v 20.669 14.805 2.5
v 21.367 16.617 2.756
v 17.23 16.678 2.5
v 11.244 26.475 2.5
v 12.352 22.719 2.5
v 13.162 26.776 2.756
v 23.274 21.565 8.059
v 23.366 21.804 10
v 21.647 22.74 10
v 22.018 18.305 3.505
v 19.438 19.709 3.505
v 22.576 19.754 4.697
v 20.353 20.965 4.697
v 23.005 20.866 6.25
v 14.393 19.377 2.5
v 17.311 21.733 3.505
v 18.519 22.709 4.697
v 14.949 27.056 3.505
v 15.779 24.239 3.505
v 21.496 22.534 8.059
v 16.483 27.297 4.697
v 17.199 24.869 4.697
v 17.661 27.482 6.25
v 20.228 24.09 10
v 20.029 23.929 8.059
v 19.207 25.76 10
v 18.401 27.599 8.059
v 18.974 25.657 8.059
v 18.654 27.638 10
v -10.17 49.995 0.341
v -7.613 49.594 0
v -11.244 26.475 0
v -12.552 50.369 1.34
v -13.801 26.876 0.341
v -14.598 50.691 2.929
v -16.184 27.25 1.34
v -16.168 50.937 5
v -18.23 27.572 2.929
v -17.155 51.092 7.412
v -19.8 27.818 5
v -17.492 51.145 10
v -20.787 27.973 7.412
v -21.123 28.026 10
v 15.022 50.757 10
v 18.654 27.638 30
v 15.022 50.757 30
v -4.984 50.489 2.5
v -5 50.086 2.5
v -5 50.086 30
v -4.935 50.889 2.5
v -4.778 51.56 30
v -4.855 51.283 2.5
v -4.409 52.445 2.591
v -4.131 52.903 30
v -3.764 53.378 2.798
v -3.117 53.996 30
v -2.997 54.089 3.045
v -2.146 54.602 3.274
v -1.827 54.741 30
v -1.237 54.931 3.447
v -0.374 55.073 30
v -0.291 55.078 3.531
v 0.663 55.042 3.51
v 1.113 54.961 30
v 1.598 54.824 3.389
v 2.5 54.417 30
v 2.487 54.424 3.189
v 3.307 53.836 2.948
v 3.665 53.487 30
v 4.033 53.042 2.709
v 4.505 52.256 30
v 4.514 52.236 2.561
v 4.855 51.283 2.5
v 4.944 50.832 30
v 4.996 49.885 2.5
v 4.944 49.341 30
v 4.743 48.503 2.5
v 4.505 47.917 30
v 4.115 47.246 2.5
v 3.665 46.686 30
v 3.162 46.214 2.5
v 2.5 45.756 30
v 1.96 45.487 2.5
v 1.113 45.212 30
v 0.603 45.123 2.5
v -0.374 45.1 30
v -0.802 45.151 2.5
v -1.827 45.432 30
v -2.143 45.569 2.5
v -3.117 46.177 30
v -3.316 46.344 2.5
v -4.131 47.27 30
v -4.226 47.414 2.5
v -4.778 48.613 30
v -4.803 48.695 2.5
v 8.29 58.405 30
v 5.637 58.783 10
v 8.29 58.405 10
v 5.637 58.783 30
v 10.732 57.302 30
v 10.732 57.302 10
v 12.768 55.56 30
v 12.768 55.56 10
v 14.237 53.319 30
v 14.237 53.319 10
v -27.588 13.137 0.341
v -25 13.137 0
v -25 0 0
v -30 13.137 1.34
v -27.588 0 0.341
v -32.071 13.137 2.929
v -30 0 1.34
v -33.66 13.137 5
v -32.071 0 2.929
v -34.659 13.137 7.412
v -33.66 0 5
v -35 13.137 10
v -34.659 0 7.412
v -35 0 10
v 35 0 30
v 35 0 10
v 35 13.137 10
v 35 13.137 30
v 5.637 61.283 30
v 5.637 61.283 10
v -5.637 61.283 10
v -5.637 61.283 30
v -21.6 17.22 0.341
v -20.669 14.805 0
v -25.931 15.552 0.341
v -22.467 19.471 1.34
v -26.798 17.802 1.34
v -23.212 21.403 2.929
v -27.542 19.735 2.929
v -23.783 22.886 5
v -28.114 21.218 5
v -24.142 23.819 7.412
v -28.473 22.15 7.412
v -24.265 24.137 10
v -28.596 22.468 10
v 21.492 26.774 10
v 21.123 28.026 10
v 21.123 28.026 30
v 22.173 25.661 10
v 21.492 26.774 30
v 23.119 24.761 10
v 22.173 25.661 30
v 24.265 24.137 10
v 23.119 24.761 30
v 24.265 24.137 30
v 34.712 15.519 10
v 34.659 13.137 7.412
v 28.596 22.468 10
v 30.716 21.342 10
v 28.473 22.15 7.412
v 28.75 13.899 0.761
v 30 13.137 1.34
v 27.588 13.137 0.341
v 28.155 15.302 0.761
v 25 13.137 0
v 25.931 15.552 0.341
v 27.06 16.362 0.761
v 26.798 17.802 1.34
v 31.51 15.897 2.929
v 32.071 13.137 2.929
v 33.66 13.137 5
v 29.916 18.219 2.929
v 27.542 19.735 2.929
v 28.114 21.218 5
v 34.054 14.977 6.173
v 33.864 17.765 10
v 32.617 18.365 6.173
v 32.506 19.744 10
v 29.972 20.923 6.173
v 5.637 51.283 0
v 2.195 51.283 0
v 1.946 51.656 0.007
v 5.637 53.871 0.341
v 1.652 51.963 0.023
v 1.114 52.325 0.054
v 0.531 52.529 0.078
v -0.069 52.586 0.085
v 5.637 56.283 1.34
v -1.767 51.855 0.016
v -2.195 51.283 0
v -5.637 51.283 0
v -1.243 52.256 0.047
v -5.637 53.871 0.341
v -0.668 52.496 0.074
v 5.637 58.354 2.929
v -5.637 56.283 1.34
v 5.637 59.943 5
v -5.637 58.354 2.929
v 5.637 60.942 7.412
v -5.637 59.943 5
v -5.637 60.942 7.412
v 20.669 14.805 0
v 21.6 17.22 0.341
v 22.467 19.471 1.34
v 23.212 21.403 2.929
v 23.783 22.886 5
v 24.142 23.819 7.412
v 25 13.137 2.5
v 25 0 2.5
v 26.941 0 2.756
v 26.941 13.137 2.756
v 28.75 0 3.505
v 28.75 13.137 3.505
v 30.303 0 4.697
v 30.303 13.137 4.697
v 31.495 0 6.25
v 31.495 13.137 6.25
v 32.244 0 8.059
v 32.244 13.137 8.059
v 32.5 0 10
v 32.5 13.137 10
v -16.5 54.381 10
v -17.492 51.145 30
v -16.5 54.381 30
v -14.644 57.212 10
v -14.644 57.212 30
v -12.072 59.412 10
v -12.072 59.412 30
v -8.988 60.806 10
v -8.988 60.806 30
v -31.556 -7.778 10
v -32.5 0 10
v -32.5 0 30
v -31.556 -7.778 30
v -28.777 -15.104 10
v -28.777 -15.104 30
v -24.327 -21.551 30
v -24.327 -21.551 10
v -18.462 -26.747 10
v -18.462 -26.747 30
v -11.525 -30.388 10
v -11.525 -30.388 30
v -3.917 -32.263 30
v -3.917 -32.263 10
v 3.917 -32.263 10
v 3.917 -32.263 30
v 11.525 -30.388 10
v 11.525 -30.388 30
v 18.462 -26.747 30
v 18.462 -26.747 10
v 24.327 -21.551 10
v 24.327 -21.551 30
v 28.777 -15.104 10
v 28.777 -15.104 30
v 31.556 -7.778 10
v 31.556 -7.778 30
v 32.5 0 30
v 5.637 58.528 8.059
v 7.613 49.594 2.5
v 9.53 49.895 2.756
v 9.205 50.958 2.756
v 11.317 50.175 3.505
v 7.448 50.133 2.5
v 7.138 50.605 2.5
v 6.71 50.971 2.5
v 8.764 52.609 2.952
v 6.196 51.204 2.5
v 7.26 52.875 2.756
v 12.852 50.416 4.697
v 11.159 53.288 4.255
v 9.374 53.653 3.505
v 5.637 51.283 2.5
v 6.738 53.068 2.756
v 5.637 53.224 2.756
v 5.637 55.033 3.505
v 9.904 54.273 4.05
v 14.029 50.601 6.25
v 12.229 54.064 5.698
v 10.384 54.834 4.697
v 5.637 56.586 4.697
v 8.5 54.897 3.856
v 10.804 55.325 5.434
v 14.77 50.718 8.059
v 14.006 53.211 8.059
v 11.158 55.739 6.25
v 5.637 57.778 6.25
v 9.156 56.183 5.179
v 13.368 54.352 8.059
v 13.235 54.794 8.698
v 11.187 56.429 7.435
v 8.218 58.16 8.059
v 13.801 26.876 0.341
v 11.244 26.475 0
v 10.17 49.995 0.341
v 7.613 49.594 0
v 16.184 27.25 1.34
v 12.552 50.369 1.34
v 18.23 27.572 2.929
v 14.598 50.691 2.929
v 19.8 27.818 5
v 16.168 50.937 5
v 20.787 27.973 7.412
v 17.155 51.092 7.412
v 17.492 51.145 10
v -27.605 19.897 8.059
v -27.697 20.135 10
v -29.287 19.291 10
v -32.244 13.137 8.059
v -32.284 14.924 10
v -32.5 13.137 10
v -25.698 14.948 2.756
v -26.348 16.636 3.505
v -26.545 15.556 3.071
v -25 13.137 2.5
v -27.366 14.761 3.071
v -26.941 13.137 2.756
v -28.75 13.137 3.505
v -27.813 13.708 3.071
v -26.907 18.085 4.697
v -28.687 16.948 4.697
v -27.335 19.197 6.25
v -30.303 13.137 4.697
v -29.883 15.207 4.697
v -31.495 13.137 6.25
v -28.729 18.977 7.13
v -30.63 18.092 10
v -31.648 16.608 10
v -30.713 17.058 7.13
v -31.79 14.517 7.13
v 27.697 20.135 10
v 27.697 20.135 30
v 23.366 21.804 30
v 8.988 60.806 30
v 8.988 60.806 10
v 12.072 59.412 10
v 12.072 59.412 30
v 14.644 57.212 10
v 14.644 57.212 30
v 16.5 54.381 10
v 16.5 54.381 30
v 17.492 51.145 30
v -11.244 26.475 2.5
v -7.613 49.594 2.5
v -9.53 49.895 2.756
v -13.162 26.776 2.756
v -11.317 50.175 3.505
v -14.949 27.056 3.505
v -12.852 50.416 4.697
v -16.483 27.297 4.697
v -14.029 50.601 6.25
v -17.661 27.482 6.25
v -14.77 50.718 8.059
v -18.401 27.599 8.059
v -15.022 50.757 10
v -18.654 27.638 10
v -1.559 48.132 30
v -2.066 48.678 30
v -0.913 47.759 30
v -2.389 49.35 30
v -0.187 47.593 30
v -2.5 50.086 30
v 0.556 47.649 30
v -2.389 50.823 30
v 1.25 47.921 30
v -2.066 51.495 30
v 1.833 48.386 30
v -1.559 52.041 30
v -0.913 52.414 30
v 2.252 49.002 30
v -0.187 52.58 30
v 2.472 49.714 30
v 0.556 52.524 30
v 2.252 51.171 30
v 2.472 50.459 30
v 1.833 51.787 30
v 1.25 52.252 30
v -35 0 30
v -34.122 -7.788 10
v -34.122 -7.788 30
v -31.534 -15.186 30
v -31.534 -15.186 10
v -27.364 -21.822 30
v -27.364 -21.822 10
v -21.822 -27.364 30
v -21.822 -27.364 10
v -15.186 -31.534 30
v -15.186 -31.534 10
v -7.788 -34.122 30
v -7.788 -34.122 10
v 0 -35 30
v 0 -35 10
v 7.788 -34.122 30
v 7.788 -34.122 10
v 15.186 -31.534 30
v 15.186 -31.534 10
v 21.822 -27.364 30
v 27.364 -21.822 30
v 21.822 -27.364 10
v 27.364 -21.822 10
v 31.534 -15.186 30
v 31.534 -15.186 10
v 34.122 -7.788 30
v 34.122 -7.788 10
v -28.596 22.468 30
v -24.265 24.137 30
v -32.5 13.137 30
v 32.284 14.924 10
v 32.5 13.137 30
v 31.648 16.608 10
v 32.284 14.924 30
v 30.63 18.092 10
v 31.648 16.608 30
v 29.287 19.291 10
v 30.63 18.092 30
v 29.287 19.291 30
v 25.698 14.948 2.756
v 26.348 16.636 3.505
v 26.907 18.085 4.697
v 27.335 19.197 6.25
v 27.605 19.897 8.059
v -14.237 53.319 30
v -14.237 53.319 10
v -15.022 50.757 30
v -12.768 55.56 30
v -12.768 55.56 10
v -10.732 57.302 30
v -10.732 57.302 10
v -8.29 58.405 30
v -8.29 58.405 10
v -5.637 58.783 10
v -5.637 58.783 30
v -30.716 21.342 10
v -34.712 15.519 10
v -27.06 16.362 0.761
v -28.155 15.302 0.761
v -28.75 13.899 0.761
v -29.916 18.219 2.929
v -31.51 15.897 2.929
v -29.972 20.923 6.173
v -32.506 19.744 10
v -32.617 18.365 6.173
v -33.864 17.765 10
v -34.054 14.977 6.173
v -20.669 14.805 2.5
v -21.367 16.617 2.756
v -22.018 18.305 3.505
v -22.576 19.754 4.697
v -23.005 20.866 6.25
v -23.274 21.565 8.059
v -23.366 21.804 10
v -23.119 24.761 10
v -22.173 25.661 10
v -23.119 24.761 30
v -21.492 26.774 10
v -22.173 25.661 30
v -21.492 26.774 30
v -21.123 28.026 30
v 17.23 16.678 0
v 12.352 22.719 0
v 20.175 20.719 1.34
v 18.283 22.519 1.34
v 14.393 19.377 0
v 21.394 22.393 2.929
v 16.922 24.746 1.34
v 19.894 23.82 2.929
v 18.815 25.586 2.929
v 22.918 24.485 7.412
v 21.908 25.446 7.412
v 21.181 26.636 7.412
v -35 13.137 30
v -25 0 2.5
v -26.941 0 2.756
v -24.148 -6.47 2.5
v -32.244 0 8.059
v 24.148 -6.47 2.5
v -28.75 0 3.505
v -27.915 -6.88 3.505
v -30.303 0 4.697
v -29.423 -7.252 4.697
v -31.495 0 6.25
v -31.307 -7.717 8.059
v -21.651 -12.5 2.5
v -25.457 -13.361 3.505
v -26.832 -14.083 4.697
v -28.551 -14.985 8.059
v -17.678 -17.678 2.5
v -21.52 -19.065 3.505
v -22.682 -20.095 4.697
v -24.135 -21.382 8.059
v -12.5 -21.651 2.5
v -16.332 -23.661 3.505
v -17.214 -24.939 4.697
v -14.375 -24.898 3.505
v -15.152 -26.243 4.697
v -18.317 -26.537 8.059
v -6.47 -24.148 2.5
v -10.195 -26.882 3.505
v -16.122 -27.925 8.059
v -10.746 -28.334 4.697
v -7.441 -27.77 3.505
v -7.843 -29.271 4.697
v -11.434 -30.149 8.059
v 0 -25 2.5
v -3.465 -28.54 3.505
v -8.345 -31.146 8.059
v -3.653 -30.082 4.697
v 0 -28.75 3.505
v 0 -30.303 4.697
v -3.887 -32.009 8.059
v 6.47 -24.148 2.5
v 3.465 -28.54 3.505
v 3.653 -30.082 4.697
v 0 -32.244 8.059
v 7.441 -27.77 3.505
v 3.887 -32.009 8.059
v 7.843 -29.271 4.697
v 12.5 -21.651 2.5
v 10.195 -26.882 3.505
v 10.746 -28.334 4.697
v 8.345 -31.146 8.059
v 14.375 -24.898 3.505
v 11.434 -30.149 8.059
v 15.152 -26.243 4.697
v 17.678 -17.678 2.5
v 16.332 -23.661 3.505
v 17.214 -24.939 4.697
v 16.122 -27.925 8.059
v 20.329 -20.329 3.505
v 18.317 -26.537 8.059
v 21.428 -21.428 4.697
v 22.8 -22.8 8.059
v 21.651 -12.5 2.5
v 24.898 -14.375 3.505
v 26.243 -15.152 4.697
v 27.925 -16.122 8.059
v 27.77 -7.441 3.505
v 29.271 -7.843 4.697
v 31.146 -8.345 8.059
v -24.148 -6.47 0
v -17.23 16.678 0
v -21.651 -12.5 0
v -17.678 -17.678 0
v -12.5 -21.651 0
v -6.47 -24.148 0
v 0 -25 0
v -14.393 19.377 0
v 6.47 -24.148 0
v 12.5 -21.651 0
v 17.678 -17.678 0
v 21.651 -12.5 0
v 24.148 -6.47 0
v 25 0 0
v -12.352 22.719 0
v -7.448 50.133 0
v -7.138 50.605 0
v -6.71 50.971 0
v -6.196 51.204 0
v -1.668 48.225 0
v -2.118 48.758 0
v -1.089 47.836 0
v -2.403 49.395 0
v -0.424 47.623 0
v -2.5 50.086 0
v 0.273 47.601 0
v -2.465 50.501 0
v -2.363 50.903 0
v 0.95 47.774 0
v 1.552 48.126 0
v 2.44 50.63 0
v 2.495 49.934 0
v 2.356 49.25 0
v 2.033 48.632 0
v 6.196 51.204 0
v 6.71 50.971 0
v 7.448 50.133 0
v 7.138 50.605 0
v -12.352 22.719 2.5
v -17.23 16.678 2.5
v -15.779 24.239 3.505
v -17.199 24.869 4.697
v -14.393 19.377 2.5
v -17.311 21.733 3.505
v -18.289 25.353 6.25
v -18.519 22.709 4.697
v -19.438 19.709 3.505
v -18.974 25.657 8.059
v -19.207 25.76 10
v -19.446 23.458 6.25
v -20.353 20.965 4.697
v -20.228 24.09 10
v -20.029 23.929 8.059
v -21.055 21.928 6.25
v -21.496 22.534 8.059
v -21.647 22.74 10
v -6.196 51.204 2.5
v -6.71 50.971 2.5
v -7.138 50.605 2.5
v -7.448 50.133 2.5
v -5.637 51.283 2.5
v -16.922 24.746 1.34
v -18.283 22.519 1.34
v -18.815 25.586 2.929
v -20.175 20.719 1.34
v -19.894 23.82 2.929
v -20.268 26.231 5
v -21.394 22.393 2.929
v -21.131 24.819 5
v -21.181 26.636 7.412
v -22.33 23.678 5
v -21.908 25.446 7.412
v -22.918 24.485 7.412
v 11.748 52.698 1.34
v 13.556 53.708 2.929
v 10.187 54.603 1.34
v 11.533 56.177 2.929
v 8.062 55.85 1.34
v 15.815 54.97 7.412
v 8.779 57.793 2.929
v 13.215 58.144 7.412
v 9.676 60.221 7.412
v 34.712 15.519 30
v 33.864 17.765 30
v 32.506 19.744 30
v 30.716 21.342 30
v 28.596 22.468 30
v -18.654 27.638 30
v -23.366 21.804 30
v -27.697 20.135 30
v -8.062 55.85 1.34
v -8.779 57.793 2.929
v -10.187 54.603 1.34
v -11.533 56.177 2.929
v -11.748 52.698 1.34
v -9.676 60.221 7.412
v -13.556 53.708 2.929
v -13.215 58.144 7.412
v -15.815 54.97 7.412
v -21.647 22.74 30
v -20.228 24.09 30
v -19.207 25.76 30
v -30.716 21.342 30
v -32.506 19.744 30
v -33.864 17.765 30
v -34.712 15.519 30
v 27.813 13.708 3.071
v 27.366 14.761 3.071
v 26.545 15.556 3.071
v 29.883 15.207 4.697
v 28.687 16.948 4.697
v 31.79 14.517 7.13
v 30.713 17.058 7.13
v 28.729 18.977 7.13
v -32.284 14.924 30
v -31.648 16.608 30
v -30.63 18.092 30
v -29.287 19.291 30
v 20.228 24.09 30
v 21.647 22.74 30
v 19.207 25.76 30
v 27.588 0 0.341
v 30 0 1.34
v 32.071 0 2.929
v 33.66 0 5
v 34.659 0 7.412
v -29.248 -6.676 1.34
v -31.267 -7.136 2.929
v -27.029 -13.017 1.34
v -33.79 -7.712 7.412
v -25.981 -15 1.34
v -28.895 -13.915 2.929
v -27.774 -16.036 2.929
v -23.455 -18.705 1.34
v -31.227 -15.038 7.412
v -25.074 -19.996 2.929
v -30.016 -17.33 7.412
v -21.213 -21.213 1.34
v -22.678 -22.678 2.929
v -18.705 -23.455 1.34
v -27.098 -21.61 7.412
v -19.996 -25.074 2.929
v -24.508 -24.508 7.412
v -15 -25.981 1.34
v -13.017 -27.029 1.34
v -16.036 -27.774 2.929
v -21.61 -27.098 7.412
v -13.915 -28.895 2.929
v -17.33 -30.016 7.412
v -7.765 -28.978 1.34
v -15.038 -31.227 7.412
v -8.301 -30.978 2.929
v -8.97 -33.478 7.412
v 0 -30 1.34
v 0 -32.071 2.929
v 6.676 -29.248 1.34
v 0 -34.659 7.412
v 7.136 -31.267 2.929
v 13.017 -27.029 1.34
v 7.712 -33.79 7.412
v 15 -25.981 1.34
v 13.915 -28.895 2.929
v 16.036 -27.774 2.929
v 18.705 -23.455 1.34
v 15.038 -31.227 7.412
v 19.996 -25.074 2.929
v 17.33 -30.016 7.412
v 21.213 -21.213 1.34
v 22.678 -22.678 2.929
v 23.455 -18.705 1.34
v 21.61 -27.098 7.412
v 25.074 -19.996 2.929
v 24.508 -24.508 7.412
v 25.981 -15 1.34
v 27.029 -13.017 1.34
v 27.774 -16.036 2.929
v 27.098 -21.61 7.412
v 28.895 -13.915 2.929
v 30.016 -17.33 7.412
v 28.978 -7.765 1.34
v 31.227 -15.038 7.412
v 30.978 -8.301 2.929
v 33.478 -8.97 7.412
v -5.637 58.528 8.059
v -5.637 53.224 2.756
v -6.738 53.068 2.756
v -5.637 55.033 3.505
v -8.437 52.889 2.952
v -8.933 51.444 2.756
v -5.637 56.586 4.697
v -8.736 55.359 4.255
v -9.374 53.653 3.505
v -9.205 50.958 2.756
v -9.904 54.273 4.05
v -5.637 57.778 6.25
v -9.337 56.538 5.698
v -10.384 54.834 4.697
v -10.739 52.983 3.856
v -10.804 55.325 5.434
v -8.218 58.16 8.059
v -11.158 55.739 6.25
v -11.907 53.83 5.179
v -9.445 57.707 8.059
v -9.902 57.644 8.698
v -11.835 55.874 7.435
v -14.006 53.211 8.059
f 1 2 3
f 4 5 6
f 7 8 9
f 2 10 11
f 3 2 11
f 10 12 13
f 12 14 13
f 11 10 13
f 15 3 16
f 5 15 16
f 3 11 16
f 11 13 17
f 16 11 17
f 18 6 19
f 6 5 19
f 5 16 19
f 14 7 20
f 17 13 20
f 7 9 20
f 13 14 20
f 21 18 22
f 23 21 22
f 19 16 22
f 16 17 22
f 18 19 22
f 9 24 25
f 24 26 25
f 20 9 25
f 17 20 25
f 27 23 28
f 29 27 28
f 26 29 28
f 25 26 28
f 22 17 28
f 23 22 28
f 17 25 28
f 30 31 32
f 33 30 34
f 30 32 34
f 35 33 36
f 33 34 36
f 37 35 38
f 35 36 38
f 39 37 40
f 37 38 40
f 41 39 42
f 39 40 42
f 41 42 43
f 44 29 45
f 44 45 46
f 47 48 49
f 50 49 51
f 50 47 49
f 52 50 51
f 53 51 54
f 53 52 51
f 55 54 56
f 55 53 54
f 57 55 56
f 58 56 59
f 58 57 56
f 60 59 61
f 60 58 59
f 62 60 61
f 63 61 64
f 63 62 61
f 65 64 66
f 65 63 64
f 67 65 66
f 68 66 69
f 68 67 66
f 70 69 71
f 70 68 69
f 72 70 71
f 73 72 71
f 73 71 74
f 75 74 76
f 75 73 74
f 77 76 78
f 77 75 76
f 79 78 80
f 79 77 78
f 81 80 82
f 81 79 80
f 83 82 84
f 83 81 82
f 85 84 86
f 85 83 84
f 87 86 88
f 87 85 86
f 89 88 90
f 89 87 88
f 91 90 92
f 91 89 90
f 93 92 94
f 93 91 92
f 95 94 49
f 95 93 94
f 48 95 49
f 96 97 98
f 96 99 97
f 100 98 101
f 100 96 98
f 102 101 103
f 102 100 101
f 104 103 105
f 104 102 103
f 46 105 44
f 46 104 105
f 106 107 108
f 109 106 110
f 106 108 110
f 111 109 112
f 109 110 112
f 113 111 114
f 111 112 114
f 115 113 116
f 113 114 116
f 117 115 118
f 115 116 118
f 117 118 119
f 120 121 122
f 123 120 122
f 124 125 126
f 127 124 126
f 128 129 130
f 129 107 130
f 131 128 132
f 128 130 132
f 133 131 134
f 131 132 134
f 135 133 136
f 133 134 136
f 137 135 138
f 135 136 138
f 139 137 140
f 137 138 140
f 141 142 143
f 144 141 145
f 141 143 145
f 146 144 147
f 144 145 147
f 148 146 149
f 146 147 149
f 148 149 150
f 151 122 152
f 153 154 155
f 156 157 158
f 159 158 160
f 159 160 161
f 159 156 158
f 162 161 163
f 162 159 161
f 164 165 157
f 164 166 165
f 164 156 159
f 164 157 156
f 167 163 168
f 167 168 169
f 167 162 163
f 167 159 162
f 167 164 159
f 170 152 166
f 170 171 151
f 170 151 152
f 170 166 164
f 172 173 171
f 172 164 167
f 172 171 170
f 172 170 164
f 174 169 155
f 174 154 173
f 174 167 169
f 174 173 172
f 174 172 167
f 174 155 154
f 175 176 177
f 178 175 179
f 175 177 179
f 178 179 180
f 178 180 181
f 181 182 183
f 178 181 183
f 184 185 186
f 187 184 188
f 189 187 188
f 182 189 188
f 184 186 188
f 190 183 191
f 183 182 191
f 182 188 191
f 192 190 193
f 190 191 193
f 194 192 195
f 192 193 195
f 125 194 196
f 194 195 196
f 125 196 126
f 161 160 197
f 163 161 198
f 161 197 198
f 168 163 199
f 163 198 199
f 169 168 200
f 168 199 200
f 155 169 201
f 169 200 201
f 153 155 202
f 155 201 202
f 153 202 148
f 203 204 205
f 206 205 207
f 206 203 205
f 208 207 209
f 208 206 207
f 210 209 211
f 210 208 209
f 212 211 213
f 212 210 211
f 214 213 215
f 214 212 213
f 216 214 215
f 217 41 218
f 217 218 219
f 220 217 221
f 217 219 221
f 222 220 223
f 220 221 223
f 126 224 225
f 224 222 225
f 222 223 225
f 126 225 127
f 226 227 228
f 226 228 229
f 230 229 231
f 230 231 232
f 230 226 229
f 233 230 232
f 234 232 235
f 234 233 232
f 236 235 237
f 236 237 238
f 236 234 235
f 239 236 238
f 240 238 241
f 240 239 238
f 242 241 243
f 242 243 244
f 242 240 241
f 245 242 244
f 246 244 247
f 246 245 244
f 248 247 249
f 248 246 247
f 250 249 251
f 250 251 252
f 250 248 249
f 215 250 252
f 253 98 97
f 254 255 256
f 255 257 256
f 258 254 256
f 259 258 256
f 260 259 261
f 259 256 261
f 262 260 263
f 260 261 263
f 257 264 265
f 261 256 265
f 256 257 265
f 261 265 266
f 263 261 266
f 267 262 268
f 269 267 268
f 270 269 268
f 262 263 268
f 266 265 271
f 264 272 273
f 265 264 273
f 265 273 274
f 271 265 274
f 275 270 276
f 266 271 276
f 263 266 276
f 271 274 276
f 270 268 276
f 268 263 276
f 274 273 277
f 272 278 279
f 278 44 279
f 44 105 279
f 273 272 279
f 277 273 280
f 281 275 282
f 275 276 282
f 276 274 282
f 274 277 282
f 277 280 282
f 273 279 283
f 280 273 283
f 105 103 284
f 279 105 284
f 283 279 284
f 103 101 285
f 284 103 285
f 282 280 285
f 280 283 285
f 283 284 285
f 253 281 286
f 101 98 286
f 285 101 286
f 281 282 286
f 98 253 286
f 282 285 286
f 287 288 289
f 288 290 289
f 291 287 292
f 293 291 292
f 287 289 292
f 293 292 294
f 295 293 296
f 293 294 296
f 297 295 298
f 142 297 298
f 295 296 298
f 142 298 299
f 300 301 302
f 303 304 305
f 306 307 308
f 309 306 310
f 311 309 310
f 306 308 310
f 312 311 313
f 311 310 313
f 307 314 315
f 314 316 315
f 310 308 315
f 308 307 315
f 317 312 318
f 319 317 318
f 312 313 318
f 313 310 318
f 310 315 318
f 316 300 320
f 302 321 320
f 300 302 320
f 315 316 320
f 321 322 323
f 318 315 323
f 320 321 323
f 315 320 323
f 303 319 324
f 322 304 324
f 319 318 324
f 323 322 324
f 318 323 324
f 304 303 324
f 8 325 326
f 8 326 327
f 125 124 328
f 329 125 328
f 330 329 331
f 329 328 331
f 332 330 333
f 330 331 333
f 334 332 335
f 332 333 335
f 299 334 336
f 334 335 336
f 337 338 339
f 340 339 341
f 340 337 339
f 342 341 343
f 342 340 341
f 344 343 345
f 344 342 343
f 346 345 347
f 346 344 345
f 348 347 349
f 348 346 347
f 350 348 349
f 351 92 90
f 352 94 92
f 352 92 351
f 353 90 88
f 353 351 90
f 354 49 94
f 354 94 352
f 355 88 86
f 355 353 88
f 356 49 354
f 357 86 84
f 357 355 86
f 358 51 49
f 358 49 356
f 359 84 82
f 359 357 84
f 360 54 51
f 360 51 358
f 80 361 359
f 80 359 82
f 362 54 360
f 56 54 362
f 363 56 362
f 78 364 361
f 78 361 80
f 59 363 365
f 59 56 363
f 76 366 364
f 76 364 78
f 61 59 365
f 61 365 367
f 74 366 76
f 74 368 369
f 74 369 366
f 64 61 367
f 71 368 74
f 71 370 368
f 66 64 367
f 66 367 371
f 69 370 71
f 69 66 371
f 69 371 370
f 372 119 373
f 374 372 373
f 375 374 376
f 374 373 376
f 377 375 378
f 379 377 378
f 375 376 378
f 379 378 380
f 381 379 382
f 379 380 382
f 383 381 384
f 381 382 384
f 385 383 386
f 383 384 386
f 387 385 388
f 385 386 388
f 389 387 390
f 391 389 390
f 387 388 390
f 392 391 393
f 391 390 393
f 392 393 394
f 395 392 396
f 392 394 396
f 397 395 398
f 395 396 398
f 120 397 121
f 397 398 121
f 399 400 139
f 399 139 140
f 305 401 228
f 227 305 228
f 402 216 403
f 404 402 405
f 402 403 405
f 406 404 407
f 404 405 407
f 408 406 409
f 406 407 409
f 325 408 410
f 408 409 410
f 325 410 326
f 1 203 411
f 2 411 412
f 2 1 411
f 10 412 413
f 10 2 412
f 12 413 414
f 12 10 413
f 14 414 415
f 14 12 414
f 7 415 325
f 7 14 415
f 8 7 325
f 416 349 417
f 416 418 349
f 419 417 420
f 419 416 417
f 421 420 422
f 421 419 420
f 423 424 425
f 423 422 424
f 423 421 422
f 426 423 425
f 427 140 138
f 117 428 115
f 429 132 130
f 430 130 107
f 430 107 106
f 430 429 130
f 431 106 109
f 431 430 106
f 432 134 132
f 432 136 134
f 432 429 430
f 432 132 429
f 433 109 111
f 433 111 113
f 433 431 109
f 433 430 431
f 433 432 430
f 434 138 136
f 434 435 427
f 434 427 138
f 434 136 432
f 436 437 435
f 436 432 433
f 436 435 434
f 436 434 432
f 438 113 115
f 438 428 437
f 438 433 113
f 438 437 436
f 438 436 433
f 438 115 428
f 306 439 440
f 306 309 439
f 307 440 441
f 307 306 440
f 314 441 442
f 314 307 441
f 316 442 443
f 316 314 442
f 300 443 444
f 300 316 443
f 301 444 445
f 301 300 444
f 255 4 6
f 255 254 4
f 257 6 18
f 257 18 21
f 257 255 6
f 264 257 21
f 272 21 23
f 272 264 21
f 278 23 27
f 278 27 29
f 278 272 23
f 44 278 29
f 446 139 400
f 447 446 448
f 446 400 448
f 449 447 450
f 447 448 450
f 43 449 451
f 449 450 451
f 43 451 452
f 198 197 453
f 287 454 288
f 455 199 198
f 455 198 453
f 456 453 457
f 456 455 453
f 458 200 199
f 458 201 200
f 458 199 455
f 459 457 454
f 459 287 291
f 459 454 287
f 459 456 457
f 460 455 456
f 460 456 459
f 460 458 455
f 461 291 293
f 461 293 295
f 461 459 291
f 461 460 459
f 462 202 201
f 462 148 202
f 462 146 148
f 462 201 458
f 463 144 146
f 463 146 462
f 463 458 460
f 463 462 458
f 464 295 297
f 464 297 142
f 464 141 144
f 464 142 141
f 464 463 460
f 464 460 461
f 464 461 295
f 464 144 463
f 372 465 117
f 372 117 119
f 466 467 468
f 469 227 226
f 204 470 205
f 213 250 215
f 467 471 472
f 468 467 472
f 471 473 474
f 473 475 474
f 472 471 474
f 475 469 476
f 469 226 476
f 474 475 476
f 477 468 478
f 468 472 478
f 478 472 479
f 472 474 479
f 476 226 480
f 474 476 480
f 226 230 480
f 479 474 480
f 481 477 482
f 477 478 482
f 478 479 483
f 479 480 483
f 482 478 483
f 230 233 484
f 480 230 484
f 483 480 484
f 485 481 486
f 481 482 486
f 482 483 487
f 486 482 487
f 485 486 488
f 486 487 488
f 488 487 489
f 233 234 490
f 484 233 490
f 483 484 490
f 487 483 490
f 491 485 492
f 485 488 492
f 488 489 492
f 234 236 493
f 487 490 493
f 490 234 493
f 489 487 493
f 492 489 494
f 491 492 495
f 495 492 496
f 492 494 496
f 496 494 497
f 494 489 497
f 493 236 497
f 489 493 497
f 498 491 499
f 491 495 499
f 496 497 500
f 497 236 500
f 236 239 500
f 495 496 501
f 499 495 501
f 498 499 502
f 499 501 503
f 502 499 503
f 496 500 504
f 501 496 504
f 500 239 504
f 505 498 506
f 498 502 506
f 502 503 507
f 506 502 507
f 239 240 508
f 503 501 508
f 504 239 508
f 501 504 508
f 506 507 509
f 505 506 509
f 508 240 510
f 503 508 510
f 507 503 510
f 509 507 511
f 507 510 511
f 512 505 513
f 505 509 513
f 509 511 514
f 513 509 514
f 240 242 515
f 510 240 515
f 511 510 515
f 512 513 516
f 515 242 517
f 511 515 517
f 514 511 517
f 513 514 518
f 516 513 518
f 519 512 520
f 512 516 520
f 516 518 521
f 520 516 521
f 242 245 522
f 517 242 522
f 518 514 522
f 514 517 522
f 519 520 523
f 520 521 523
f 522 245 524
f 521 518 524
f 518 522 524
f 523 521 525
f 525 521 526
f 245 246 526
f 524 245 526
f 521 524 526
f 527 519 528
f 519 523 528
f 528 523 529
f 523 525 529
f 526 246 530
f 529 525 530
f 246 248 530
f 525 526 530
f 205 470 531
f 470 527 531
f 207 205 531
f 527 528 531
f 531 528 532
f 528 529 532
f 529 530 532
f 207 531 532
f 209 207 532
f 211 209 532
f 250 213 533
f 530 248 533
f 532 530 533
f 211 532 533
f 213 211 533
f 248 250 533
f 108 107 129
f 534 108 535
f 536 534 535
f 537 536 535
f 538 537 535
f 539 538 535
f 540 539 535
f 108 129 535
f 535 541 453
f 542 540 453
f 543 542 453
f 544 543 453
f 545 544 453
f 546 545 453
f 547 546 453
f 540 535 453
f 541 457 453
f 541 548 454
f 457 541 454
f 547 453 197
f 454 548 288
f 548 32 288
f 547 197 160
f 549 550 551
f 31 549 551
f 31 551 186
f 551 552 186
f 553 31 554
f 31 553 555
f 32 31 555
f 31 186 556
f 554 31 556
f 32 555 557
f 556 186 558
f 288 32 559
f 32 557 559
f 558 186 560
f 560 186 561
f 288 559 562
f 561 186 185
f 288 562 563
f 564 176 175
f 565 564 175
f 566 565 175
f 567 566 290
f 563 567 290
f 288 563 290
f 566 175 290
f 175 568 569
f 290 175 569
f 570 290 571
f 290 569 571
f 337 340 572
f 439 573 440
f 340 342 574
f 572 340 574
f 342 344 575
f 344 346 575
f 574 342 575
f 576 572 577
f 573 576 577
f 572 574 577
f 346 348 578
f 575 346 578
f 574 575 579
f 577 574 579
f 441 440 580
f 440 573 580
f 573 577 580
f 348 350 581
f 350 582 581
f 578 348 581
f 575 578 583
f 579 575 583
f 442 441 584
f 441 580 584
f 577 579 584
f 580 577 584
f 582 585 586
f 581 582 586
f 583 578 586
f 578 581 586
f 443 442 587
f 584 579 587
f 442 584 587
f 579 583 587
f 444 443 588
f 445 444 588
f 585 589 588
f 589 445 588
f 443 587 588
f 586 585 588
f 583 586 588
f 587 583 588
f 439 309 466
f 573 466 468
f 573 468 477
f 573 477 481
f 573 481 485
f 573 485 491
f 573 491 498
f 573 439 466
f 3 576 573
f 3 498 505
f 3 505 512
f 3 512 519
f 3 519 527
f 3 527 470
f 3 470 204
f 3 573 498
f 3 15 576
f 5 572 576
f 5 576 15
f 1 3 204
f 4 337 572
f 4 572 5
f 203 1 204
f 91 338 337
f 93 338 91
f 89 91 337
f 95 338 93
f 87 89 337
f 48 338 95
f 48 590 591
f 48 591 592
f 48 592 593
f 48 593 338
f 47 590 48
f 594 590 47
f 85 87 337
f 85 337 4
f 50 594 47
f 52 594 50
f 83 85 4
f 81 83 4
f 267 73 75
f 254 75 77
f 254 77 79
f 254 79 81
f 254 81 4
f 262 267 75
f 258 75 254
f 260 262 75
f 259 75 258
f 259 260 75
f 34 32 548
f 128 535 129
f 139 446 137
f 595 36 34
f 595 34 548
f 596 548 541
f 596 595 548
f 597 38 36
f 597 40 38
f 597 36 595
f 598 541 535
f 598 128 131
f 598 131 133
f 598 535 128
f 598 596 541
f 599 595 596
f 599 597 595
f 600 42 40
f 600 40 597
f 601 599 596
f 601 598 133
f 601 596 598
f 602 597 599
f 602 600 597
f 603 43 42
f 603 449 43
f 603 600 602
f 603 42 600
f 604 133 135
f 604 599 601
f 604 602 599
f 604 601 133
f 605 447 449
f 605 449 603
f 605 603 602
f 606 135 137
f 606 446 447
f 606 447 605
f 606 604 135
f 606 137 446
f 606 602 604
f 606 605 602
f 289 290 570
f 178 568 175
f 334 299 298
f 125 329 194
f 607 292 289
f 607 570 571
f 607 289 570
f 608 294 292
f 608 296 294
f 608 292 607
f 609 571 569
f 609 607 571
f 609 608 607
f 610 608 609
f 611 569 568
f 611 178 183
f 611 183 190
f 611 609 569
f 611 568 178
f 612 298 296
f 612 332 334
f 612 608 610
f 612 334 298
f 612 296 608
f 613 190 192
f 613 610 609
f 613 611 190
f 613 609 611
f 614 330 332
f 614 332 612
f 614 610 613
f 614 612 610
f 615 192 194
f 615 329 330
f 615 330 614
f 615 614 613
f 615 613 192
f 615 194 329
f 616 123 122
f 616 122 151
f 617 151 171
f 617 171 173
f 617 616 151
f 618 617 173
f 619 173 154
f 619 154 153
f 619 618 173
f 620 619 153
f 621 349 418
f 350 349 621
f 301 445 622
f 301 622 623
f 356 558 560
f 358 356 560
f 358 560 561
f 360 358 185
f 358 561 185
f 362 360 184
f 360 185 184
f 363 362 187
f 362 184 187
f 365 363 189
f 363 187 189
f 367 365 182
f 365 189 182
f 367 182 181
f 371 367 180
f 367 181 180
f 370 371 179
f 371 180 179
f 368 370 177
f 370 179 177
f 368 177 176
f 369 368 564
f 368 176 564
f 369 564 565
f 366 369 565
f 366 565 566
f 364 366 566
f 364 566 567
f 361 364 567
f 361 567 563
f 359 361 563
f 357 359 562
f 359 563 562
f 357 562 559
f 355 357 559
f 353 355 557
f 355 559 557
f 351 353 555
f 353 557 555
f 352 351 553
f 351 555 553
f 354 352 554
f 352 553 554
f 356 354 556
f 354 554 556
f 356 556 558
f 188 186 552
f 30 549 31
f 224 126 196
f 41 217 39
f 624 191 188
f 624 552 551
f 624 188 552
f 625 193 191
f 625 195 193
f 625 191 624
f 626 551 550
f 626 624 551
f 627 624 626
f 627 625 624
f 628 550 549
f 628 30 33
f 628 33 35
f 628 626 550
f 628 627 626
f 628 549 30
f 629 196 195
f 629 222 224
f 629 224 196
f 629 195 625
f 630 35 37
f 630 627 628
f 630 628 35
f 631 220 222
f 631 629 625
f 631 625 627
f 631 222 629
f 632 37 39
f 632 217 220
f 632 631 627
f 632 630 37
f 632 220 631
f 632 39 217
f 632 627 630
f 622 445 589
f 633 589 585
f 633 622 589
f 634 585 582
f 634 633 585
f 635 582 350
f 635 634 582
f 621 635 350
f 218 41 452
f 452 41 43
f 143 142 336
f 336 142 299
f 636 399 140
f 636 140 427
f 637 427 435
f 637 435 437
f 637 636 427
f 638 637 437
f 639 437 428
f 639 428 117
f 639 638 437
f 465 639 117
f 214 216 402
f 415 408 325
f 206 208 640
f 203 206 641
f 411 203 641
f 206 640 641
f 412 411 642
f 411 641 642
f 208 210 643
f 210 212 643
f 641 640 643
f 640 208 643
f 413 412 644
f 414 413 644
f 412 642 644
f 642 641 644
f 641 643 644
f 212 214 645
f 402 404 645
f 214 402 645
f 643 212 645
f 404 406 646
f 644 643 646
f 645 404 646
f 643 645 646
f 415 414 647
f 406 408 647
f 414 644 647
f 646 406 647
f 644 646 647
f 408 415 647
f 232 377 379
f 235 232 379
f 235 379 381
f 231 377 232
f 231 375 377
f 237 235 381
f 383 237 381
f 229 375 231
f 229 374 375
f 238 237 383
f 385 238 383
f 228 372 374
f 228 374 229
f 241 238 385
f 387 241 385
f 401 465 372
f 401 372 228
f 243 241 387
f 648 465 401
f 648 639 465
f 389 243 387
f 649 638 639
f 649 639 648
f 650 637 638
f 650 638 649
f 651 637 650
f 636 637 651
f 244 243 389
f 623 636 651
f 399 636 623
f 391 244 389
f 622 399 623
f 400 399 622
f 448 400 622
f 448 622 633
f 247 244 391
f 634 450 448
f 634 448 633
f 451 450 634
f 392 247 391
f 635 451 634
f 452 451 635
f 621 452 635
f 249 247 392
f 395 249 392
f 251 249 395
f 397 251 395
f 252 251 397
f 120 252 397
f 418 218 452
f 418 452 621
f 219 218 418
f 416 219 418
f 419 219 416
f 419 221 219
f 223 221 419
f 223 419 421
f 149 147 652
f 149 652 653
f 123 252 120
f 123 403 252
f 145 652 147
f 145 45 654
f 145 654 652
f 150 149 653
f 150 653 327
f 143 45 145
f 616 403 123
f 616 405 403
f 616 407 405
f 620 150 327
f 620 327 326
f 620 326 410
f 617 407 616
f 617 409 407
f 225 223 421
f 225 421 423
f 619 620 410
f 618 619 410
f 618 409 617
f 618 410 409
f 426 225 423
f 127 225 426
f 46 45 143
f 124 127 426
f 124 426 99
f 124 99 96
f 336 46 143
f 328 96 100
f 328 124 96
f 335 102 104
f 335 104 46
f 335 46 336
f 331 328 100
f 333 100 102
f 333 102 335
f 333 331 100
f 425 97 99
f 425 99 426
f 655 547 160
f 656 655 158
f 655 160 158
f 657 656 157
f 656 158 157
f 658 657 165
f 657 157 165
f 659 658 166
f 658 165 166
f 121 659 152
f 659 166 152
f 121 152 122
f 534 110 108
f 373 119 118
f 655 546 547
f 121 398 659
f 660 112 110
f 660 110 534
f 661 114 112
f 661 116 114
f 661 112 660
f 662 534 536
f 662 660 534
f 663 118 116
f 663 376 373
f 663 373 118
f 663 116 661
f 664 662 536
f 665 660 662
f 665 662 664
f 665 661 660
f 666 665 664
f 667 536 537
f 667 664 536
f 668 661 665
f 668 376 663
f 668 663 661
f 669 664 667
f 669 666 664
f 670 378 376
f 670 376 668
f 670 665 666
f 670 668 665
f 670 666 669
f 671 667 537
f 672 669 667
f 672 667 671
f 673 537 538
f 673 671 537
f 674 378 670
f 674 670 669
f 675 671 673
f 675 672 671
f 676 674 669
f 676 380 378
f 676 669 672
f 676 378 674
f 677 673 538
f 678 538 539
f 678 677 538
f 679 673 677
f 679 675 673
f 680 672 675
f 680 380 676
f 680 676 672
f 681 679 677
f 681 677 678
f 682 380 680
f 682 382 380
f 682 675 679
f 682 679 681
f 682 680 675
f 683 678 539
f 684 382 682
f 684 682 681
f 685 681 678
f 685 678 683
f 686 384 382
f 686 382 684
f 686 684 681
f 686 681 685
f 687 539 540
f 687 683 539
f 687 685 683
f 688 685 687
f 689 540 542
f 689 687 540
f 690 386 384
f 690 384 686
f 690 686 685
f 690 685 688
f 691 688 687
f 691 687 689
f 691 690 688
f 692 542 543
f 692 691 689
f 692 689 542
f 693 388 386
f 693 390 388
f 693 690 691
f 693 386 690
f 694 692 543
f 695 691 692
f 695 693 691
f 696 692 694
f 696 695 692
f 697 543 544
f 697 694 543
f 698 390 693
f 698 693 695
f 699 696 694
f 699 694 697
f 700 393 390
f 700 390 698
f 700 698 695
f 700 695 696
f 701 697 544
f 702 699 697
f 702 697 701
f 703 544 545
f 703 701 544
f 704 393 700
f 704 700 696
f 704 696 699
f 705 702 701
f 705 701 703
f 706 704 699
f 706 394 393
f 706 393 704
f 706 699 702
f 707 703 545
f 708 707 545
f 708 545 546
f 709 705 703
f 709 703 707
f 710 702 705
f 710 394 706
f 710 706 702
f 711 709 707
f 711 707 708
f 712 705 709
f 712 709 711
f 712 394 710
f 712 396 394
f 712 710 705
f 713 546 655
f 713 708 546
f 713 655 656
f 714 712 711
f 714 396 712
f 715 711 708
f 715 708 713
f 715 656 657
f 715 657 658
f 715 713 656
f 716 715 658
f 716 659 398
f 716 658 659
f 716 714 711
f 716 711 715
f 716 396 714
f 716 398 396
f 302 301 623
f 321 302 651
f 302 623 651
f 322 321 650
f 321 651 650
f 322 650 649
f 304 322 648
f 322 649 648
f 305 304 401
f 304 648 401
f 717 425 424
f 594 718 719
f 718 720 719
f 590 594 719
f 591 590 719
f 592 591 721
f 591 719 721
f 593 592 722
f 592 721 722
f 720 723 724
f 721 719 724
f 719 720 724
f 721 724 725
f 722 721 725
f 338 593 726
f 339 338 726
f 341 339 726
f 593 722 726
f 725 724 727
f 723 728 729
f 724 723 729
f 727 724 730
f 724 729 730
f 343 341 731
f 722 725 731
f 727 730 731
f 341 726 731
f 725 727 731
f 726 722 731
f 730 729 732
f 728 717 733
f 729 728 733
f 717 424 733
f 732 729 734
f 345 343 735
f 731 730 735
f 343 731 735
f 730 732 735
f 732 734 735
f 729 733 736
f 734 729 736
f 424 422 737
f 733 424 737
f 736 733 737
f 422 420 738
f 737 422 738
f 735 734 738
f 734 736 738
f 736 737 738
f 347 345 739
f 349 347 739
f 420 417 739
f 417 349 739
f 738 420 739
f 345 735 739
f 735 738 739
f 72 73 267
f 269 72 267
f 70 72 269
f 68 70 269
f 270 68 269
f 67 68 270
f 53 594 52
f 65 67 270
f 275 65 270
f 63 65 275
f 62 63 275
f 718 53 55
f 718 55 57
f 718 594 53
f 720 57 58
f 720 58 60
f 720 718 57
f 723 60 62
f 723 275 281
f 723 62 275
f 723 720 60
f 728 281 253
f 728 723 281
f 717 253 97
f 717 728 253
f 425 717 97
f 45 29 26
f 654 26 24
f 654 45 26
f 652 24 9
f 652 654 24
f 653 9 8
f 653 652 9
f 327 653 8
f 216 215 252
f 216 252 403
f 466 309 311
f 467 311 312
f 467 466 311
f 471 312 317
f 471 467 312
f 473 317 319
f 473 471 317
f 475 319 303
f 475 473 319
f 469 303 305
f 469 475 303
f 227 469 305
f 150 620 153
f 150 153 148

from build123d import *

# Parameters (mm, degrees)
F1_DEPTH = 30
F2_R     = 10
F3_R     = 5
F4_R     = 12
F5_R     = 10
F7_D     = 5
F8_T     = -2.5


with BuildPart() as f1:
    # F0 (on Top) → F1 (new body)
    with BuildSketch(Plane.XY):
        with BuildLine():
            Line((15.899289, 61.283179), (-15.899289, 61.283179))
            Line((-15.899289, 61.283179), (-21.571181, 25.174486))
            Line((-21.571181, 25.174486), (-35, 20))
            Line((-35, 20), (-35, 0))
            ThreePointArc((-35, 0), (0, -35), (35, 0))
            Line((35, 0), (35, 20))
            Line((35, 20), (21.571181, 25.174486))
            Line((21.571181, 25.174486), (15.899289, 61.283179))
        make_face()
    extrude(amount=F1_DEPTH)

    # F2
    f2_edges = [f1.edges().sort_by_distance(p)[0] for p in [
        (35, 20, 15),
        (-35, 20, 15),
    ]]
    fillet(f2_edges, radius=F2_R)

    # F3
    f3_edges = [f1.edges().sort_by_distance(p)[0] for p in [
        (21.571181, 25.174486, 15),
        (-21.571181, 25.174486, 15),
    ]]
    fillet(f3_edges, radius=F3_R)

    # F4
    f4_edges = [f1.edges().sort_by_distance(p)[0] for p in [
        (15.899289, 61.283179, 15),
        (-15.899289, 61.283179, 15),
    ]]
    fillet(f4_edges, radius=F4_R)

    # F5
    f5_edges = [f1.edges().sort_by_distance(p)[0] for p in [
        (19.30748, 39.585778, 0),
    ]]
    fillet(f5_edges, radius=F5_R)

    # F7 (through all)
    with Locations(Plane.XY.offset(30)):
        with Locations((0, 50.086495)):
            Hole(F7_D / 2)

    # F8
    f8_openings = [f1.faces().sort_by_distance(p)[0] for p in [
        (0, 9.29282, 30),
    ]]
    offset(amount=F8_T, openings=f8_openings)


solid = f1.part
